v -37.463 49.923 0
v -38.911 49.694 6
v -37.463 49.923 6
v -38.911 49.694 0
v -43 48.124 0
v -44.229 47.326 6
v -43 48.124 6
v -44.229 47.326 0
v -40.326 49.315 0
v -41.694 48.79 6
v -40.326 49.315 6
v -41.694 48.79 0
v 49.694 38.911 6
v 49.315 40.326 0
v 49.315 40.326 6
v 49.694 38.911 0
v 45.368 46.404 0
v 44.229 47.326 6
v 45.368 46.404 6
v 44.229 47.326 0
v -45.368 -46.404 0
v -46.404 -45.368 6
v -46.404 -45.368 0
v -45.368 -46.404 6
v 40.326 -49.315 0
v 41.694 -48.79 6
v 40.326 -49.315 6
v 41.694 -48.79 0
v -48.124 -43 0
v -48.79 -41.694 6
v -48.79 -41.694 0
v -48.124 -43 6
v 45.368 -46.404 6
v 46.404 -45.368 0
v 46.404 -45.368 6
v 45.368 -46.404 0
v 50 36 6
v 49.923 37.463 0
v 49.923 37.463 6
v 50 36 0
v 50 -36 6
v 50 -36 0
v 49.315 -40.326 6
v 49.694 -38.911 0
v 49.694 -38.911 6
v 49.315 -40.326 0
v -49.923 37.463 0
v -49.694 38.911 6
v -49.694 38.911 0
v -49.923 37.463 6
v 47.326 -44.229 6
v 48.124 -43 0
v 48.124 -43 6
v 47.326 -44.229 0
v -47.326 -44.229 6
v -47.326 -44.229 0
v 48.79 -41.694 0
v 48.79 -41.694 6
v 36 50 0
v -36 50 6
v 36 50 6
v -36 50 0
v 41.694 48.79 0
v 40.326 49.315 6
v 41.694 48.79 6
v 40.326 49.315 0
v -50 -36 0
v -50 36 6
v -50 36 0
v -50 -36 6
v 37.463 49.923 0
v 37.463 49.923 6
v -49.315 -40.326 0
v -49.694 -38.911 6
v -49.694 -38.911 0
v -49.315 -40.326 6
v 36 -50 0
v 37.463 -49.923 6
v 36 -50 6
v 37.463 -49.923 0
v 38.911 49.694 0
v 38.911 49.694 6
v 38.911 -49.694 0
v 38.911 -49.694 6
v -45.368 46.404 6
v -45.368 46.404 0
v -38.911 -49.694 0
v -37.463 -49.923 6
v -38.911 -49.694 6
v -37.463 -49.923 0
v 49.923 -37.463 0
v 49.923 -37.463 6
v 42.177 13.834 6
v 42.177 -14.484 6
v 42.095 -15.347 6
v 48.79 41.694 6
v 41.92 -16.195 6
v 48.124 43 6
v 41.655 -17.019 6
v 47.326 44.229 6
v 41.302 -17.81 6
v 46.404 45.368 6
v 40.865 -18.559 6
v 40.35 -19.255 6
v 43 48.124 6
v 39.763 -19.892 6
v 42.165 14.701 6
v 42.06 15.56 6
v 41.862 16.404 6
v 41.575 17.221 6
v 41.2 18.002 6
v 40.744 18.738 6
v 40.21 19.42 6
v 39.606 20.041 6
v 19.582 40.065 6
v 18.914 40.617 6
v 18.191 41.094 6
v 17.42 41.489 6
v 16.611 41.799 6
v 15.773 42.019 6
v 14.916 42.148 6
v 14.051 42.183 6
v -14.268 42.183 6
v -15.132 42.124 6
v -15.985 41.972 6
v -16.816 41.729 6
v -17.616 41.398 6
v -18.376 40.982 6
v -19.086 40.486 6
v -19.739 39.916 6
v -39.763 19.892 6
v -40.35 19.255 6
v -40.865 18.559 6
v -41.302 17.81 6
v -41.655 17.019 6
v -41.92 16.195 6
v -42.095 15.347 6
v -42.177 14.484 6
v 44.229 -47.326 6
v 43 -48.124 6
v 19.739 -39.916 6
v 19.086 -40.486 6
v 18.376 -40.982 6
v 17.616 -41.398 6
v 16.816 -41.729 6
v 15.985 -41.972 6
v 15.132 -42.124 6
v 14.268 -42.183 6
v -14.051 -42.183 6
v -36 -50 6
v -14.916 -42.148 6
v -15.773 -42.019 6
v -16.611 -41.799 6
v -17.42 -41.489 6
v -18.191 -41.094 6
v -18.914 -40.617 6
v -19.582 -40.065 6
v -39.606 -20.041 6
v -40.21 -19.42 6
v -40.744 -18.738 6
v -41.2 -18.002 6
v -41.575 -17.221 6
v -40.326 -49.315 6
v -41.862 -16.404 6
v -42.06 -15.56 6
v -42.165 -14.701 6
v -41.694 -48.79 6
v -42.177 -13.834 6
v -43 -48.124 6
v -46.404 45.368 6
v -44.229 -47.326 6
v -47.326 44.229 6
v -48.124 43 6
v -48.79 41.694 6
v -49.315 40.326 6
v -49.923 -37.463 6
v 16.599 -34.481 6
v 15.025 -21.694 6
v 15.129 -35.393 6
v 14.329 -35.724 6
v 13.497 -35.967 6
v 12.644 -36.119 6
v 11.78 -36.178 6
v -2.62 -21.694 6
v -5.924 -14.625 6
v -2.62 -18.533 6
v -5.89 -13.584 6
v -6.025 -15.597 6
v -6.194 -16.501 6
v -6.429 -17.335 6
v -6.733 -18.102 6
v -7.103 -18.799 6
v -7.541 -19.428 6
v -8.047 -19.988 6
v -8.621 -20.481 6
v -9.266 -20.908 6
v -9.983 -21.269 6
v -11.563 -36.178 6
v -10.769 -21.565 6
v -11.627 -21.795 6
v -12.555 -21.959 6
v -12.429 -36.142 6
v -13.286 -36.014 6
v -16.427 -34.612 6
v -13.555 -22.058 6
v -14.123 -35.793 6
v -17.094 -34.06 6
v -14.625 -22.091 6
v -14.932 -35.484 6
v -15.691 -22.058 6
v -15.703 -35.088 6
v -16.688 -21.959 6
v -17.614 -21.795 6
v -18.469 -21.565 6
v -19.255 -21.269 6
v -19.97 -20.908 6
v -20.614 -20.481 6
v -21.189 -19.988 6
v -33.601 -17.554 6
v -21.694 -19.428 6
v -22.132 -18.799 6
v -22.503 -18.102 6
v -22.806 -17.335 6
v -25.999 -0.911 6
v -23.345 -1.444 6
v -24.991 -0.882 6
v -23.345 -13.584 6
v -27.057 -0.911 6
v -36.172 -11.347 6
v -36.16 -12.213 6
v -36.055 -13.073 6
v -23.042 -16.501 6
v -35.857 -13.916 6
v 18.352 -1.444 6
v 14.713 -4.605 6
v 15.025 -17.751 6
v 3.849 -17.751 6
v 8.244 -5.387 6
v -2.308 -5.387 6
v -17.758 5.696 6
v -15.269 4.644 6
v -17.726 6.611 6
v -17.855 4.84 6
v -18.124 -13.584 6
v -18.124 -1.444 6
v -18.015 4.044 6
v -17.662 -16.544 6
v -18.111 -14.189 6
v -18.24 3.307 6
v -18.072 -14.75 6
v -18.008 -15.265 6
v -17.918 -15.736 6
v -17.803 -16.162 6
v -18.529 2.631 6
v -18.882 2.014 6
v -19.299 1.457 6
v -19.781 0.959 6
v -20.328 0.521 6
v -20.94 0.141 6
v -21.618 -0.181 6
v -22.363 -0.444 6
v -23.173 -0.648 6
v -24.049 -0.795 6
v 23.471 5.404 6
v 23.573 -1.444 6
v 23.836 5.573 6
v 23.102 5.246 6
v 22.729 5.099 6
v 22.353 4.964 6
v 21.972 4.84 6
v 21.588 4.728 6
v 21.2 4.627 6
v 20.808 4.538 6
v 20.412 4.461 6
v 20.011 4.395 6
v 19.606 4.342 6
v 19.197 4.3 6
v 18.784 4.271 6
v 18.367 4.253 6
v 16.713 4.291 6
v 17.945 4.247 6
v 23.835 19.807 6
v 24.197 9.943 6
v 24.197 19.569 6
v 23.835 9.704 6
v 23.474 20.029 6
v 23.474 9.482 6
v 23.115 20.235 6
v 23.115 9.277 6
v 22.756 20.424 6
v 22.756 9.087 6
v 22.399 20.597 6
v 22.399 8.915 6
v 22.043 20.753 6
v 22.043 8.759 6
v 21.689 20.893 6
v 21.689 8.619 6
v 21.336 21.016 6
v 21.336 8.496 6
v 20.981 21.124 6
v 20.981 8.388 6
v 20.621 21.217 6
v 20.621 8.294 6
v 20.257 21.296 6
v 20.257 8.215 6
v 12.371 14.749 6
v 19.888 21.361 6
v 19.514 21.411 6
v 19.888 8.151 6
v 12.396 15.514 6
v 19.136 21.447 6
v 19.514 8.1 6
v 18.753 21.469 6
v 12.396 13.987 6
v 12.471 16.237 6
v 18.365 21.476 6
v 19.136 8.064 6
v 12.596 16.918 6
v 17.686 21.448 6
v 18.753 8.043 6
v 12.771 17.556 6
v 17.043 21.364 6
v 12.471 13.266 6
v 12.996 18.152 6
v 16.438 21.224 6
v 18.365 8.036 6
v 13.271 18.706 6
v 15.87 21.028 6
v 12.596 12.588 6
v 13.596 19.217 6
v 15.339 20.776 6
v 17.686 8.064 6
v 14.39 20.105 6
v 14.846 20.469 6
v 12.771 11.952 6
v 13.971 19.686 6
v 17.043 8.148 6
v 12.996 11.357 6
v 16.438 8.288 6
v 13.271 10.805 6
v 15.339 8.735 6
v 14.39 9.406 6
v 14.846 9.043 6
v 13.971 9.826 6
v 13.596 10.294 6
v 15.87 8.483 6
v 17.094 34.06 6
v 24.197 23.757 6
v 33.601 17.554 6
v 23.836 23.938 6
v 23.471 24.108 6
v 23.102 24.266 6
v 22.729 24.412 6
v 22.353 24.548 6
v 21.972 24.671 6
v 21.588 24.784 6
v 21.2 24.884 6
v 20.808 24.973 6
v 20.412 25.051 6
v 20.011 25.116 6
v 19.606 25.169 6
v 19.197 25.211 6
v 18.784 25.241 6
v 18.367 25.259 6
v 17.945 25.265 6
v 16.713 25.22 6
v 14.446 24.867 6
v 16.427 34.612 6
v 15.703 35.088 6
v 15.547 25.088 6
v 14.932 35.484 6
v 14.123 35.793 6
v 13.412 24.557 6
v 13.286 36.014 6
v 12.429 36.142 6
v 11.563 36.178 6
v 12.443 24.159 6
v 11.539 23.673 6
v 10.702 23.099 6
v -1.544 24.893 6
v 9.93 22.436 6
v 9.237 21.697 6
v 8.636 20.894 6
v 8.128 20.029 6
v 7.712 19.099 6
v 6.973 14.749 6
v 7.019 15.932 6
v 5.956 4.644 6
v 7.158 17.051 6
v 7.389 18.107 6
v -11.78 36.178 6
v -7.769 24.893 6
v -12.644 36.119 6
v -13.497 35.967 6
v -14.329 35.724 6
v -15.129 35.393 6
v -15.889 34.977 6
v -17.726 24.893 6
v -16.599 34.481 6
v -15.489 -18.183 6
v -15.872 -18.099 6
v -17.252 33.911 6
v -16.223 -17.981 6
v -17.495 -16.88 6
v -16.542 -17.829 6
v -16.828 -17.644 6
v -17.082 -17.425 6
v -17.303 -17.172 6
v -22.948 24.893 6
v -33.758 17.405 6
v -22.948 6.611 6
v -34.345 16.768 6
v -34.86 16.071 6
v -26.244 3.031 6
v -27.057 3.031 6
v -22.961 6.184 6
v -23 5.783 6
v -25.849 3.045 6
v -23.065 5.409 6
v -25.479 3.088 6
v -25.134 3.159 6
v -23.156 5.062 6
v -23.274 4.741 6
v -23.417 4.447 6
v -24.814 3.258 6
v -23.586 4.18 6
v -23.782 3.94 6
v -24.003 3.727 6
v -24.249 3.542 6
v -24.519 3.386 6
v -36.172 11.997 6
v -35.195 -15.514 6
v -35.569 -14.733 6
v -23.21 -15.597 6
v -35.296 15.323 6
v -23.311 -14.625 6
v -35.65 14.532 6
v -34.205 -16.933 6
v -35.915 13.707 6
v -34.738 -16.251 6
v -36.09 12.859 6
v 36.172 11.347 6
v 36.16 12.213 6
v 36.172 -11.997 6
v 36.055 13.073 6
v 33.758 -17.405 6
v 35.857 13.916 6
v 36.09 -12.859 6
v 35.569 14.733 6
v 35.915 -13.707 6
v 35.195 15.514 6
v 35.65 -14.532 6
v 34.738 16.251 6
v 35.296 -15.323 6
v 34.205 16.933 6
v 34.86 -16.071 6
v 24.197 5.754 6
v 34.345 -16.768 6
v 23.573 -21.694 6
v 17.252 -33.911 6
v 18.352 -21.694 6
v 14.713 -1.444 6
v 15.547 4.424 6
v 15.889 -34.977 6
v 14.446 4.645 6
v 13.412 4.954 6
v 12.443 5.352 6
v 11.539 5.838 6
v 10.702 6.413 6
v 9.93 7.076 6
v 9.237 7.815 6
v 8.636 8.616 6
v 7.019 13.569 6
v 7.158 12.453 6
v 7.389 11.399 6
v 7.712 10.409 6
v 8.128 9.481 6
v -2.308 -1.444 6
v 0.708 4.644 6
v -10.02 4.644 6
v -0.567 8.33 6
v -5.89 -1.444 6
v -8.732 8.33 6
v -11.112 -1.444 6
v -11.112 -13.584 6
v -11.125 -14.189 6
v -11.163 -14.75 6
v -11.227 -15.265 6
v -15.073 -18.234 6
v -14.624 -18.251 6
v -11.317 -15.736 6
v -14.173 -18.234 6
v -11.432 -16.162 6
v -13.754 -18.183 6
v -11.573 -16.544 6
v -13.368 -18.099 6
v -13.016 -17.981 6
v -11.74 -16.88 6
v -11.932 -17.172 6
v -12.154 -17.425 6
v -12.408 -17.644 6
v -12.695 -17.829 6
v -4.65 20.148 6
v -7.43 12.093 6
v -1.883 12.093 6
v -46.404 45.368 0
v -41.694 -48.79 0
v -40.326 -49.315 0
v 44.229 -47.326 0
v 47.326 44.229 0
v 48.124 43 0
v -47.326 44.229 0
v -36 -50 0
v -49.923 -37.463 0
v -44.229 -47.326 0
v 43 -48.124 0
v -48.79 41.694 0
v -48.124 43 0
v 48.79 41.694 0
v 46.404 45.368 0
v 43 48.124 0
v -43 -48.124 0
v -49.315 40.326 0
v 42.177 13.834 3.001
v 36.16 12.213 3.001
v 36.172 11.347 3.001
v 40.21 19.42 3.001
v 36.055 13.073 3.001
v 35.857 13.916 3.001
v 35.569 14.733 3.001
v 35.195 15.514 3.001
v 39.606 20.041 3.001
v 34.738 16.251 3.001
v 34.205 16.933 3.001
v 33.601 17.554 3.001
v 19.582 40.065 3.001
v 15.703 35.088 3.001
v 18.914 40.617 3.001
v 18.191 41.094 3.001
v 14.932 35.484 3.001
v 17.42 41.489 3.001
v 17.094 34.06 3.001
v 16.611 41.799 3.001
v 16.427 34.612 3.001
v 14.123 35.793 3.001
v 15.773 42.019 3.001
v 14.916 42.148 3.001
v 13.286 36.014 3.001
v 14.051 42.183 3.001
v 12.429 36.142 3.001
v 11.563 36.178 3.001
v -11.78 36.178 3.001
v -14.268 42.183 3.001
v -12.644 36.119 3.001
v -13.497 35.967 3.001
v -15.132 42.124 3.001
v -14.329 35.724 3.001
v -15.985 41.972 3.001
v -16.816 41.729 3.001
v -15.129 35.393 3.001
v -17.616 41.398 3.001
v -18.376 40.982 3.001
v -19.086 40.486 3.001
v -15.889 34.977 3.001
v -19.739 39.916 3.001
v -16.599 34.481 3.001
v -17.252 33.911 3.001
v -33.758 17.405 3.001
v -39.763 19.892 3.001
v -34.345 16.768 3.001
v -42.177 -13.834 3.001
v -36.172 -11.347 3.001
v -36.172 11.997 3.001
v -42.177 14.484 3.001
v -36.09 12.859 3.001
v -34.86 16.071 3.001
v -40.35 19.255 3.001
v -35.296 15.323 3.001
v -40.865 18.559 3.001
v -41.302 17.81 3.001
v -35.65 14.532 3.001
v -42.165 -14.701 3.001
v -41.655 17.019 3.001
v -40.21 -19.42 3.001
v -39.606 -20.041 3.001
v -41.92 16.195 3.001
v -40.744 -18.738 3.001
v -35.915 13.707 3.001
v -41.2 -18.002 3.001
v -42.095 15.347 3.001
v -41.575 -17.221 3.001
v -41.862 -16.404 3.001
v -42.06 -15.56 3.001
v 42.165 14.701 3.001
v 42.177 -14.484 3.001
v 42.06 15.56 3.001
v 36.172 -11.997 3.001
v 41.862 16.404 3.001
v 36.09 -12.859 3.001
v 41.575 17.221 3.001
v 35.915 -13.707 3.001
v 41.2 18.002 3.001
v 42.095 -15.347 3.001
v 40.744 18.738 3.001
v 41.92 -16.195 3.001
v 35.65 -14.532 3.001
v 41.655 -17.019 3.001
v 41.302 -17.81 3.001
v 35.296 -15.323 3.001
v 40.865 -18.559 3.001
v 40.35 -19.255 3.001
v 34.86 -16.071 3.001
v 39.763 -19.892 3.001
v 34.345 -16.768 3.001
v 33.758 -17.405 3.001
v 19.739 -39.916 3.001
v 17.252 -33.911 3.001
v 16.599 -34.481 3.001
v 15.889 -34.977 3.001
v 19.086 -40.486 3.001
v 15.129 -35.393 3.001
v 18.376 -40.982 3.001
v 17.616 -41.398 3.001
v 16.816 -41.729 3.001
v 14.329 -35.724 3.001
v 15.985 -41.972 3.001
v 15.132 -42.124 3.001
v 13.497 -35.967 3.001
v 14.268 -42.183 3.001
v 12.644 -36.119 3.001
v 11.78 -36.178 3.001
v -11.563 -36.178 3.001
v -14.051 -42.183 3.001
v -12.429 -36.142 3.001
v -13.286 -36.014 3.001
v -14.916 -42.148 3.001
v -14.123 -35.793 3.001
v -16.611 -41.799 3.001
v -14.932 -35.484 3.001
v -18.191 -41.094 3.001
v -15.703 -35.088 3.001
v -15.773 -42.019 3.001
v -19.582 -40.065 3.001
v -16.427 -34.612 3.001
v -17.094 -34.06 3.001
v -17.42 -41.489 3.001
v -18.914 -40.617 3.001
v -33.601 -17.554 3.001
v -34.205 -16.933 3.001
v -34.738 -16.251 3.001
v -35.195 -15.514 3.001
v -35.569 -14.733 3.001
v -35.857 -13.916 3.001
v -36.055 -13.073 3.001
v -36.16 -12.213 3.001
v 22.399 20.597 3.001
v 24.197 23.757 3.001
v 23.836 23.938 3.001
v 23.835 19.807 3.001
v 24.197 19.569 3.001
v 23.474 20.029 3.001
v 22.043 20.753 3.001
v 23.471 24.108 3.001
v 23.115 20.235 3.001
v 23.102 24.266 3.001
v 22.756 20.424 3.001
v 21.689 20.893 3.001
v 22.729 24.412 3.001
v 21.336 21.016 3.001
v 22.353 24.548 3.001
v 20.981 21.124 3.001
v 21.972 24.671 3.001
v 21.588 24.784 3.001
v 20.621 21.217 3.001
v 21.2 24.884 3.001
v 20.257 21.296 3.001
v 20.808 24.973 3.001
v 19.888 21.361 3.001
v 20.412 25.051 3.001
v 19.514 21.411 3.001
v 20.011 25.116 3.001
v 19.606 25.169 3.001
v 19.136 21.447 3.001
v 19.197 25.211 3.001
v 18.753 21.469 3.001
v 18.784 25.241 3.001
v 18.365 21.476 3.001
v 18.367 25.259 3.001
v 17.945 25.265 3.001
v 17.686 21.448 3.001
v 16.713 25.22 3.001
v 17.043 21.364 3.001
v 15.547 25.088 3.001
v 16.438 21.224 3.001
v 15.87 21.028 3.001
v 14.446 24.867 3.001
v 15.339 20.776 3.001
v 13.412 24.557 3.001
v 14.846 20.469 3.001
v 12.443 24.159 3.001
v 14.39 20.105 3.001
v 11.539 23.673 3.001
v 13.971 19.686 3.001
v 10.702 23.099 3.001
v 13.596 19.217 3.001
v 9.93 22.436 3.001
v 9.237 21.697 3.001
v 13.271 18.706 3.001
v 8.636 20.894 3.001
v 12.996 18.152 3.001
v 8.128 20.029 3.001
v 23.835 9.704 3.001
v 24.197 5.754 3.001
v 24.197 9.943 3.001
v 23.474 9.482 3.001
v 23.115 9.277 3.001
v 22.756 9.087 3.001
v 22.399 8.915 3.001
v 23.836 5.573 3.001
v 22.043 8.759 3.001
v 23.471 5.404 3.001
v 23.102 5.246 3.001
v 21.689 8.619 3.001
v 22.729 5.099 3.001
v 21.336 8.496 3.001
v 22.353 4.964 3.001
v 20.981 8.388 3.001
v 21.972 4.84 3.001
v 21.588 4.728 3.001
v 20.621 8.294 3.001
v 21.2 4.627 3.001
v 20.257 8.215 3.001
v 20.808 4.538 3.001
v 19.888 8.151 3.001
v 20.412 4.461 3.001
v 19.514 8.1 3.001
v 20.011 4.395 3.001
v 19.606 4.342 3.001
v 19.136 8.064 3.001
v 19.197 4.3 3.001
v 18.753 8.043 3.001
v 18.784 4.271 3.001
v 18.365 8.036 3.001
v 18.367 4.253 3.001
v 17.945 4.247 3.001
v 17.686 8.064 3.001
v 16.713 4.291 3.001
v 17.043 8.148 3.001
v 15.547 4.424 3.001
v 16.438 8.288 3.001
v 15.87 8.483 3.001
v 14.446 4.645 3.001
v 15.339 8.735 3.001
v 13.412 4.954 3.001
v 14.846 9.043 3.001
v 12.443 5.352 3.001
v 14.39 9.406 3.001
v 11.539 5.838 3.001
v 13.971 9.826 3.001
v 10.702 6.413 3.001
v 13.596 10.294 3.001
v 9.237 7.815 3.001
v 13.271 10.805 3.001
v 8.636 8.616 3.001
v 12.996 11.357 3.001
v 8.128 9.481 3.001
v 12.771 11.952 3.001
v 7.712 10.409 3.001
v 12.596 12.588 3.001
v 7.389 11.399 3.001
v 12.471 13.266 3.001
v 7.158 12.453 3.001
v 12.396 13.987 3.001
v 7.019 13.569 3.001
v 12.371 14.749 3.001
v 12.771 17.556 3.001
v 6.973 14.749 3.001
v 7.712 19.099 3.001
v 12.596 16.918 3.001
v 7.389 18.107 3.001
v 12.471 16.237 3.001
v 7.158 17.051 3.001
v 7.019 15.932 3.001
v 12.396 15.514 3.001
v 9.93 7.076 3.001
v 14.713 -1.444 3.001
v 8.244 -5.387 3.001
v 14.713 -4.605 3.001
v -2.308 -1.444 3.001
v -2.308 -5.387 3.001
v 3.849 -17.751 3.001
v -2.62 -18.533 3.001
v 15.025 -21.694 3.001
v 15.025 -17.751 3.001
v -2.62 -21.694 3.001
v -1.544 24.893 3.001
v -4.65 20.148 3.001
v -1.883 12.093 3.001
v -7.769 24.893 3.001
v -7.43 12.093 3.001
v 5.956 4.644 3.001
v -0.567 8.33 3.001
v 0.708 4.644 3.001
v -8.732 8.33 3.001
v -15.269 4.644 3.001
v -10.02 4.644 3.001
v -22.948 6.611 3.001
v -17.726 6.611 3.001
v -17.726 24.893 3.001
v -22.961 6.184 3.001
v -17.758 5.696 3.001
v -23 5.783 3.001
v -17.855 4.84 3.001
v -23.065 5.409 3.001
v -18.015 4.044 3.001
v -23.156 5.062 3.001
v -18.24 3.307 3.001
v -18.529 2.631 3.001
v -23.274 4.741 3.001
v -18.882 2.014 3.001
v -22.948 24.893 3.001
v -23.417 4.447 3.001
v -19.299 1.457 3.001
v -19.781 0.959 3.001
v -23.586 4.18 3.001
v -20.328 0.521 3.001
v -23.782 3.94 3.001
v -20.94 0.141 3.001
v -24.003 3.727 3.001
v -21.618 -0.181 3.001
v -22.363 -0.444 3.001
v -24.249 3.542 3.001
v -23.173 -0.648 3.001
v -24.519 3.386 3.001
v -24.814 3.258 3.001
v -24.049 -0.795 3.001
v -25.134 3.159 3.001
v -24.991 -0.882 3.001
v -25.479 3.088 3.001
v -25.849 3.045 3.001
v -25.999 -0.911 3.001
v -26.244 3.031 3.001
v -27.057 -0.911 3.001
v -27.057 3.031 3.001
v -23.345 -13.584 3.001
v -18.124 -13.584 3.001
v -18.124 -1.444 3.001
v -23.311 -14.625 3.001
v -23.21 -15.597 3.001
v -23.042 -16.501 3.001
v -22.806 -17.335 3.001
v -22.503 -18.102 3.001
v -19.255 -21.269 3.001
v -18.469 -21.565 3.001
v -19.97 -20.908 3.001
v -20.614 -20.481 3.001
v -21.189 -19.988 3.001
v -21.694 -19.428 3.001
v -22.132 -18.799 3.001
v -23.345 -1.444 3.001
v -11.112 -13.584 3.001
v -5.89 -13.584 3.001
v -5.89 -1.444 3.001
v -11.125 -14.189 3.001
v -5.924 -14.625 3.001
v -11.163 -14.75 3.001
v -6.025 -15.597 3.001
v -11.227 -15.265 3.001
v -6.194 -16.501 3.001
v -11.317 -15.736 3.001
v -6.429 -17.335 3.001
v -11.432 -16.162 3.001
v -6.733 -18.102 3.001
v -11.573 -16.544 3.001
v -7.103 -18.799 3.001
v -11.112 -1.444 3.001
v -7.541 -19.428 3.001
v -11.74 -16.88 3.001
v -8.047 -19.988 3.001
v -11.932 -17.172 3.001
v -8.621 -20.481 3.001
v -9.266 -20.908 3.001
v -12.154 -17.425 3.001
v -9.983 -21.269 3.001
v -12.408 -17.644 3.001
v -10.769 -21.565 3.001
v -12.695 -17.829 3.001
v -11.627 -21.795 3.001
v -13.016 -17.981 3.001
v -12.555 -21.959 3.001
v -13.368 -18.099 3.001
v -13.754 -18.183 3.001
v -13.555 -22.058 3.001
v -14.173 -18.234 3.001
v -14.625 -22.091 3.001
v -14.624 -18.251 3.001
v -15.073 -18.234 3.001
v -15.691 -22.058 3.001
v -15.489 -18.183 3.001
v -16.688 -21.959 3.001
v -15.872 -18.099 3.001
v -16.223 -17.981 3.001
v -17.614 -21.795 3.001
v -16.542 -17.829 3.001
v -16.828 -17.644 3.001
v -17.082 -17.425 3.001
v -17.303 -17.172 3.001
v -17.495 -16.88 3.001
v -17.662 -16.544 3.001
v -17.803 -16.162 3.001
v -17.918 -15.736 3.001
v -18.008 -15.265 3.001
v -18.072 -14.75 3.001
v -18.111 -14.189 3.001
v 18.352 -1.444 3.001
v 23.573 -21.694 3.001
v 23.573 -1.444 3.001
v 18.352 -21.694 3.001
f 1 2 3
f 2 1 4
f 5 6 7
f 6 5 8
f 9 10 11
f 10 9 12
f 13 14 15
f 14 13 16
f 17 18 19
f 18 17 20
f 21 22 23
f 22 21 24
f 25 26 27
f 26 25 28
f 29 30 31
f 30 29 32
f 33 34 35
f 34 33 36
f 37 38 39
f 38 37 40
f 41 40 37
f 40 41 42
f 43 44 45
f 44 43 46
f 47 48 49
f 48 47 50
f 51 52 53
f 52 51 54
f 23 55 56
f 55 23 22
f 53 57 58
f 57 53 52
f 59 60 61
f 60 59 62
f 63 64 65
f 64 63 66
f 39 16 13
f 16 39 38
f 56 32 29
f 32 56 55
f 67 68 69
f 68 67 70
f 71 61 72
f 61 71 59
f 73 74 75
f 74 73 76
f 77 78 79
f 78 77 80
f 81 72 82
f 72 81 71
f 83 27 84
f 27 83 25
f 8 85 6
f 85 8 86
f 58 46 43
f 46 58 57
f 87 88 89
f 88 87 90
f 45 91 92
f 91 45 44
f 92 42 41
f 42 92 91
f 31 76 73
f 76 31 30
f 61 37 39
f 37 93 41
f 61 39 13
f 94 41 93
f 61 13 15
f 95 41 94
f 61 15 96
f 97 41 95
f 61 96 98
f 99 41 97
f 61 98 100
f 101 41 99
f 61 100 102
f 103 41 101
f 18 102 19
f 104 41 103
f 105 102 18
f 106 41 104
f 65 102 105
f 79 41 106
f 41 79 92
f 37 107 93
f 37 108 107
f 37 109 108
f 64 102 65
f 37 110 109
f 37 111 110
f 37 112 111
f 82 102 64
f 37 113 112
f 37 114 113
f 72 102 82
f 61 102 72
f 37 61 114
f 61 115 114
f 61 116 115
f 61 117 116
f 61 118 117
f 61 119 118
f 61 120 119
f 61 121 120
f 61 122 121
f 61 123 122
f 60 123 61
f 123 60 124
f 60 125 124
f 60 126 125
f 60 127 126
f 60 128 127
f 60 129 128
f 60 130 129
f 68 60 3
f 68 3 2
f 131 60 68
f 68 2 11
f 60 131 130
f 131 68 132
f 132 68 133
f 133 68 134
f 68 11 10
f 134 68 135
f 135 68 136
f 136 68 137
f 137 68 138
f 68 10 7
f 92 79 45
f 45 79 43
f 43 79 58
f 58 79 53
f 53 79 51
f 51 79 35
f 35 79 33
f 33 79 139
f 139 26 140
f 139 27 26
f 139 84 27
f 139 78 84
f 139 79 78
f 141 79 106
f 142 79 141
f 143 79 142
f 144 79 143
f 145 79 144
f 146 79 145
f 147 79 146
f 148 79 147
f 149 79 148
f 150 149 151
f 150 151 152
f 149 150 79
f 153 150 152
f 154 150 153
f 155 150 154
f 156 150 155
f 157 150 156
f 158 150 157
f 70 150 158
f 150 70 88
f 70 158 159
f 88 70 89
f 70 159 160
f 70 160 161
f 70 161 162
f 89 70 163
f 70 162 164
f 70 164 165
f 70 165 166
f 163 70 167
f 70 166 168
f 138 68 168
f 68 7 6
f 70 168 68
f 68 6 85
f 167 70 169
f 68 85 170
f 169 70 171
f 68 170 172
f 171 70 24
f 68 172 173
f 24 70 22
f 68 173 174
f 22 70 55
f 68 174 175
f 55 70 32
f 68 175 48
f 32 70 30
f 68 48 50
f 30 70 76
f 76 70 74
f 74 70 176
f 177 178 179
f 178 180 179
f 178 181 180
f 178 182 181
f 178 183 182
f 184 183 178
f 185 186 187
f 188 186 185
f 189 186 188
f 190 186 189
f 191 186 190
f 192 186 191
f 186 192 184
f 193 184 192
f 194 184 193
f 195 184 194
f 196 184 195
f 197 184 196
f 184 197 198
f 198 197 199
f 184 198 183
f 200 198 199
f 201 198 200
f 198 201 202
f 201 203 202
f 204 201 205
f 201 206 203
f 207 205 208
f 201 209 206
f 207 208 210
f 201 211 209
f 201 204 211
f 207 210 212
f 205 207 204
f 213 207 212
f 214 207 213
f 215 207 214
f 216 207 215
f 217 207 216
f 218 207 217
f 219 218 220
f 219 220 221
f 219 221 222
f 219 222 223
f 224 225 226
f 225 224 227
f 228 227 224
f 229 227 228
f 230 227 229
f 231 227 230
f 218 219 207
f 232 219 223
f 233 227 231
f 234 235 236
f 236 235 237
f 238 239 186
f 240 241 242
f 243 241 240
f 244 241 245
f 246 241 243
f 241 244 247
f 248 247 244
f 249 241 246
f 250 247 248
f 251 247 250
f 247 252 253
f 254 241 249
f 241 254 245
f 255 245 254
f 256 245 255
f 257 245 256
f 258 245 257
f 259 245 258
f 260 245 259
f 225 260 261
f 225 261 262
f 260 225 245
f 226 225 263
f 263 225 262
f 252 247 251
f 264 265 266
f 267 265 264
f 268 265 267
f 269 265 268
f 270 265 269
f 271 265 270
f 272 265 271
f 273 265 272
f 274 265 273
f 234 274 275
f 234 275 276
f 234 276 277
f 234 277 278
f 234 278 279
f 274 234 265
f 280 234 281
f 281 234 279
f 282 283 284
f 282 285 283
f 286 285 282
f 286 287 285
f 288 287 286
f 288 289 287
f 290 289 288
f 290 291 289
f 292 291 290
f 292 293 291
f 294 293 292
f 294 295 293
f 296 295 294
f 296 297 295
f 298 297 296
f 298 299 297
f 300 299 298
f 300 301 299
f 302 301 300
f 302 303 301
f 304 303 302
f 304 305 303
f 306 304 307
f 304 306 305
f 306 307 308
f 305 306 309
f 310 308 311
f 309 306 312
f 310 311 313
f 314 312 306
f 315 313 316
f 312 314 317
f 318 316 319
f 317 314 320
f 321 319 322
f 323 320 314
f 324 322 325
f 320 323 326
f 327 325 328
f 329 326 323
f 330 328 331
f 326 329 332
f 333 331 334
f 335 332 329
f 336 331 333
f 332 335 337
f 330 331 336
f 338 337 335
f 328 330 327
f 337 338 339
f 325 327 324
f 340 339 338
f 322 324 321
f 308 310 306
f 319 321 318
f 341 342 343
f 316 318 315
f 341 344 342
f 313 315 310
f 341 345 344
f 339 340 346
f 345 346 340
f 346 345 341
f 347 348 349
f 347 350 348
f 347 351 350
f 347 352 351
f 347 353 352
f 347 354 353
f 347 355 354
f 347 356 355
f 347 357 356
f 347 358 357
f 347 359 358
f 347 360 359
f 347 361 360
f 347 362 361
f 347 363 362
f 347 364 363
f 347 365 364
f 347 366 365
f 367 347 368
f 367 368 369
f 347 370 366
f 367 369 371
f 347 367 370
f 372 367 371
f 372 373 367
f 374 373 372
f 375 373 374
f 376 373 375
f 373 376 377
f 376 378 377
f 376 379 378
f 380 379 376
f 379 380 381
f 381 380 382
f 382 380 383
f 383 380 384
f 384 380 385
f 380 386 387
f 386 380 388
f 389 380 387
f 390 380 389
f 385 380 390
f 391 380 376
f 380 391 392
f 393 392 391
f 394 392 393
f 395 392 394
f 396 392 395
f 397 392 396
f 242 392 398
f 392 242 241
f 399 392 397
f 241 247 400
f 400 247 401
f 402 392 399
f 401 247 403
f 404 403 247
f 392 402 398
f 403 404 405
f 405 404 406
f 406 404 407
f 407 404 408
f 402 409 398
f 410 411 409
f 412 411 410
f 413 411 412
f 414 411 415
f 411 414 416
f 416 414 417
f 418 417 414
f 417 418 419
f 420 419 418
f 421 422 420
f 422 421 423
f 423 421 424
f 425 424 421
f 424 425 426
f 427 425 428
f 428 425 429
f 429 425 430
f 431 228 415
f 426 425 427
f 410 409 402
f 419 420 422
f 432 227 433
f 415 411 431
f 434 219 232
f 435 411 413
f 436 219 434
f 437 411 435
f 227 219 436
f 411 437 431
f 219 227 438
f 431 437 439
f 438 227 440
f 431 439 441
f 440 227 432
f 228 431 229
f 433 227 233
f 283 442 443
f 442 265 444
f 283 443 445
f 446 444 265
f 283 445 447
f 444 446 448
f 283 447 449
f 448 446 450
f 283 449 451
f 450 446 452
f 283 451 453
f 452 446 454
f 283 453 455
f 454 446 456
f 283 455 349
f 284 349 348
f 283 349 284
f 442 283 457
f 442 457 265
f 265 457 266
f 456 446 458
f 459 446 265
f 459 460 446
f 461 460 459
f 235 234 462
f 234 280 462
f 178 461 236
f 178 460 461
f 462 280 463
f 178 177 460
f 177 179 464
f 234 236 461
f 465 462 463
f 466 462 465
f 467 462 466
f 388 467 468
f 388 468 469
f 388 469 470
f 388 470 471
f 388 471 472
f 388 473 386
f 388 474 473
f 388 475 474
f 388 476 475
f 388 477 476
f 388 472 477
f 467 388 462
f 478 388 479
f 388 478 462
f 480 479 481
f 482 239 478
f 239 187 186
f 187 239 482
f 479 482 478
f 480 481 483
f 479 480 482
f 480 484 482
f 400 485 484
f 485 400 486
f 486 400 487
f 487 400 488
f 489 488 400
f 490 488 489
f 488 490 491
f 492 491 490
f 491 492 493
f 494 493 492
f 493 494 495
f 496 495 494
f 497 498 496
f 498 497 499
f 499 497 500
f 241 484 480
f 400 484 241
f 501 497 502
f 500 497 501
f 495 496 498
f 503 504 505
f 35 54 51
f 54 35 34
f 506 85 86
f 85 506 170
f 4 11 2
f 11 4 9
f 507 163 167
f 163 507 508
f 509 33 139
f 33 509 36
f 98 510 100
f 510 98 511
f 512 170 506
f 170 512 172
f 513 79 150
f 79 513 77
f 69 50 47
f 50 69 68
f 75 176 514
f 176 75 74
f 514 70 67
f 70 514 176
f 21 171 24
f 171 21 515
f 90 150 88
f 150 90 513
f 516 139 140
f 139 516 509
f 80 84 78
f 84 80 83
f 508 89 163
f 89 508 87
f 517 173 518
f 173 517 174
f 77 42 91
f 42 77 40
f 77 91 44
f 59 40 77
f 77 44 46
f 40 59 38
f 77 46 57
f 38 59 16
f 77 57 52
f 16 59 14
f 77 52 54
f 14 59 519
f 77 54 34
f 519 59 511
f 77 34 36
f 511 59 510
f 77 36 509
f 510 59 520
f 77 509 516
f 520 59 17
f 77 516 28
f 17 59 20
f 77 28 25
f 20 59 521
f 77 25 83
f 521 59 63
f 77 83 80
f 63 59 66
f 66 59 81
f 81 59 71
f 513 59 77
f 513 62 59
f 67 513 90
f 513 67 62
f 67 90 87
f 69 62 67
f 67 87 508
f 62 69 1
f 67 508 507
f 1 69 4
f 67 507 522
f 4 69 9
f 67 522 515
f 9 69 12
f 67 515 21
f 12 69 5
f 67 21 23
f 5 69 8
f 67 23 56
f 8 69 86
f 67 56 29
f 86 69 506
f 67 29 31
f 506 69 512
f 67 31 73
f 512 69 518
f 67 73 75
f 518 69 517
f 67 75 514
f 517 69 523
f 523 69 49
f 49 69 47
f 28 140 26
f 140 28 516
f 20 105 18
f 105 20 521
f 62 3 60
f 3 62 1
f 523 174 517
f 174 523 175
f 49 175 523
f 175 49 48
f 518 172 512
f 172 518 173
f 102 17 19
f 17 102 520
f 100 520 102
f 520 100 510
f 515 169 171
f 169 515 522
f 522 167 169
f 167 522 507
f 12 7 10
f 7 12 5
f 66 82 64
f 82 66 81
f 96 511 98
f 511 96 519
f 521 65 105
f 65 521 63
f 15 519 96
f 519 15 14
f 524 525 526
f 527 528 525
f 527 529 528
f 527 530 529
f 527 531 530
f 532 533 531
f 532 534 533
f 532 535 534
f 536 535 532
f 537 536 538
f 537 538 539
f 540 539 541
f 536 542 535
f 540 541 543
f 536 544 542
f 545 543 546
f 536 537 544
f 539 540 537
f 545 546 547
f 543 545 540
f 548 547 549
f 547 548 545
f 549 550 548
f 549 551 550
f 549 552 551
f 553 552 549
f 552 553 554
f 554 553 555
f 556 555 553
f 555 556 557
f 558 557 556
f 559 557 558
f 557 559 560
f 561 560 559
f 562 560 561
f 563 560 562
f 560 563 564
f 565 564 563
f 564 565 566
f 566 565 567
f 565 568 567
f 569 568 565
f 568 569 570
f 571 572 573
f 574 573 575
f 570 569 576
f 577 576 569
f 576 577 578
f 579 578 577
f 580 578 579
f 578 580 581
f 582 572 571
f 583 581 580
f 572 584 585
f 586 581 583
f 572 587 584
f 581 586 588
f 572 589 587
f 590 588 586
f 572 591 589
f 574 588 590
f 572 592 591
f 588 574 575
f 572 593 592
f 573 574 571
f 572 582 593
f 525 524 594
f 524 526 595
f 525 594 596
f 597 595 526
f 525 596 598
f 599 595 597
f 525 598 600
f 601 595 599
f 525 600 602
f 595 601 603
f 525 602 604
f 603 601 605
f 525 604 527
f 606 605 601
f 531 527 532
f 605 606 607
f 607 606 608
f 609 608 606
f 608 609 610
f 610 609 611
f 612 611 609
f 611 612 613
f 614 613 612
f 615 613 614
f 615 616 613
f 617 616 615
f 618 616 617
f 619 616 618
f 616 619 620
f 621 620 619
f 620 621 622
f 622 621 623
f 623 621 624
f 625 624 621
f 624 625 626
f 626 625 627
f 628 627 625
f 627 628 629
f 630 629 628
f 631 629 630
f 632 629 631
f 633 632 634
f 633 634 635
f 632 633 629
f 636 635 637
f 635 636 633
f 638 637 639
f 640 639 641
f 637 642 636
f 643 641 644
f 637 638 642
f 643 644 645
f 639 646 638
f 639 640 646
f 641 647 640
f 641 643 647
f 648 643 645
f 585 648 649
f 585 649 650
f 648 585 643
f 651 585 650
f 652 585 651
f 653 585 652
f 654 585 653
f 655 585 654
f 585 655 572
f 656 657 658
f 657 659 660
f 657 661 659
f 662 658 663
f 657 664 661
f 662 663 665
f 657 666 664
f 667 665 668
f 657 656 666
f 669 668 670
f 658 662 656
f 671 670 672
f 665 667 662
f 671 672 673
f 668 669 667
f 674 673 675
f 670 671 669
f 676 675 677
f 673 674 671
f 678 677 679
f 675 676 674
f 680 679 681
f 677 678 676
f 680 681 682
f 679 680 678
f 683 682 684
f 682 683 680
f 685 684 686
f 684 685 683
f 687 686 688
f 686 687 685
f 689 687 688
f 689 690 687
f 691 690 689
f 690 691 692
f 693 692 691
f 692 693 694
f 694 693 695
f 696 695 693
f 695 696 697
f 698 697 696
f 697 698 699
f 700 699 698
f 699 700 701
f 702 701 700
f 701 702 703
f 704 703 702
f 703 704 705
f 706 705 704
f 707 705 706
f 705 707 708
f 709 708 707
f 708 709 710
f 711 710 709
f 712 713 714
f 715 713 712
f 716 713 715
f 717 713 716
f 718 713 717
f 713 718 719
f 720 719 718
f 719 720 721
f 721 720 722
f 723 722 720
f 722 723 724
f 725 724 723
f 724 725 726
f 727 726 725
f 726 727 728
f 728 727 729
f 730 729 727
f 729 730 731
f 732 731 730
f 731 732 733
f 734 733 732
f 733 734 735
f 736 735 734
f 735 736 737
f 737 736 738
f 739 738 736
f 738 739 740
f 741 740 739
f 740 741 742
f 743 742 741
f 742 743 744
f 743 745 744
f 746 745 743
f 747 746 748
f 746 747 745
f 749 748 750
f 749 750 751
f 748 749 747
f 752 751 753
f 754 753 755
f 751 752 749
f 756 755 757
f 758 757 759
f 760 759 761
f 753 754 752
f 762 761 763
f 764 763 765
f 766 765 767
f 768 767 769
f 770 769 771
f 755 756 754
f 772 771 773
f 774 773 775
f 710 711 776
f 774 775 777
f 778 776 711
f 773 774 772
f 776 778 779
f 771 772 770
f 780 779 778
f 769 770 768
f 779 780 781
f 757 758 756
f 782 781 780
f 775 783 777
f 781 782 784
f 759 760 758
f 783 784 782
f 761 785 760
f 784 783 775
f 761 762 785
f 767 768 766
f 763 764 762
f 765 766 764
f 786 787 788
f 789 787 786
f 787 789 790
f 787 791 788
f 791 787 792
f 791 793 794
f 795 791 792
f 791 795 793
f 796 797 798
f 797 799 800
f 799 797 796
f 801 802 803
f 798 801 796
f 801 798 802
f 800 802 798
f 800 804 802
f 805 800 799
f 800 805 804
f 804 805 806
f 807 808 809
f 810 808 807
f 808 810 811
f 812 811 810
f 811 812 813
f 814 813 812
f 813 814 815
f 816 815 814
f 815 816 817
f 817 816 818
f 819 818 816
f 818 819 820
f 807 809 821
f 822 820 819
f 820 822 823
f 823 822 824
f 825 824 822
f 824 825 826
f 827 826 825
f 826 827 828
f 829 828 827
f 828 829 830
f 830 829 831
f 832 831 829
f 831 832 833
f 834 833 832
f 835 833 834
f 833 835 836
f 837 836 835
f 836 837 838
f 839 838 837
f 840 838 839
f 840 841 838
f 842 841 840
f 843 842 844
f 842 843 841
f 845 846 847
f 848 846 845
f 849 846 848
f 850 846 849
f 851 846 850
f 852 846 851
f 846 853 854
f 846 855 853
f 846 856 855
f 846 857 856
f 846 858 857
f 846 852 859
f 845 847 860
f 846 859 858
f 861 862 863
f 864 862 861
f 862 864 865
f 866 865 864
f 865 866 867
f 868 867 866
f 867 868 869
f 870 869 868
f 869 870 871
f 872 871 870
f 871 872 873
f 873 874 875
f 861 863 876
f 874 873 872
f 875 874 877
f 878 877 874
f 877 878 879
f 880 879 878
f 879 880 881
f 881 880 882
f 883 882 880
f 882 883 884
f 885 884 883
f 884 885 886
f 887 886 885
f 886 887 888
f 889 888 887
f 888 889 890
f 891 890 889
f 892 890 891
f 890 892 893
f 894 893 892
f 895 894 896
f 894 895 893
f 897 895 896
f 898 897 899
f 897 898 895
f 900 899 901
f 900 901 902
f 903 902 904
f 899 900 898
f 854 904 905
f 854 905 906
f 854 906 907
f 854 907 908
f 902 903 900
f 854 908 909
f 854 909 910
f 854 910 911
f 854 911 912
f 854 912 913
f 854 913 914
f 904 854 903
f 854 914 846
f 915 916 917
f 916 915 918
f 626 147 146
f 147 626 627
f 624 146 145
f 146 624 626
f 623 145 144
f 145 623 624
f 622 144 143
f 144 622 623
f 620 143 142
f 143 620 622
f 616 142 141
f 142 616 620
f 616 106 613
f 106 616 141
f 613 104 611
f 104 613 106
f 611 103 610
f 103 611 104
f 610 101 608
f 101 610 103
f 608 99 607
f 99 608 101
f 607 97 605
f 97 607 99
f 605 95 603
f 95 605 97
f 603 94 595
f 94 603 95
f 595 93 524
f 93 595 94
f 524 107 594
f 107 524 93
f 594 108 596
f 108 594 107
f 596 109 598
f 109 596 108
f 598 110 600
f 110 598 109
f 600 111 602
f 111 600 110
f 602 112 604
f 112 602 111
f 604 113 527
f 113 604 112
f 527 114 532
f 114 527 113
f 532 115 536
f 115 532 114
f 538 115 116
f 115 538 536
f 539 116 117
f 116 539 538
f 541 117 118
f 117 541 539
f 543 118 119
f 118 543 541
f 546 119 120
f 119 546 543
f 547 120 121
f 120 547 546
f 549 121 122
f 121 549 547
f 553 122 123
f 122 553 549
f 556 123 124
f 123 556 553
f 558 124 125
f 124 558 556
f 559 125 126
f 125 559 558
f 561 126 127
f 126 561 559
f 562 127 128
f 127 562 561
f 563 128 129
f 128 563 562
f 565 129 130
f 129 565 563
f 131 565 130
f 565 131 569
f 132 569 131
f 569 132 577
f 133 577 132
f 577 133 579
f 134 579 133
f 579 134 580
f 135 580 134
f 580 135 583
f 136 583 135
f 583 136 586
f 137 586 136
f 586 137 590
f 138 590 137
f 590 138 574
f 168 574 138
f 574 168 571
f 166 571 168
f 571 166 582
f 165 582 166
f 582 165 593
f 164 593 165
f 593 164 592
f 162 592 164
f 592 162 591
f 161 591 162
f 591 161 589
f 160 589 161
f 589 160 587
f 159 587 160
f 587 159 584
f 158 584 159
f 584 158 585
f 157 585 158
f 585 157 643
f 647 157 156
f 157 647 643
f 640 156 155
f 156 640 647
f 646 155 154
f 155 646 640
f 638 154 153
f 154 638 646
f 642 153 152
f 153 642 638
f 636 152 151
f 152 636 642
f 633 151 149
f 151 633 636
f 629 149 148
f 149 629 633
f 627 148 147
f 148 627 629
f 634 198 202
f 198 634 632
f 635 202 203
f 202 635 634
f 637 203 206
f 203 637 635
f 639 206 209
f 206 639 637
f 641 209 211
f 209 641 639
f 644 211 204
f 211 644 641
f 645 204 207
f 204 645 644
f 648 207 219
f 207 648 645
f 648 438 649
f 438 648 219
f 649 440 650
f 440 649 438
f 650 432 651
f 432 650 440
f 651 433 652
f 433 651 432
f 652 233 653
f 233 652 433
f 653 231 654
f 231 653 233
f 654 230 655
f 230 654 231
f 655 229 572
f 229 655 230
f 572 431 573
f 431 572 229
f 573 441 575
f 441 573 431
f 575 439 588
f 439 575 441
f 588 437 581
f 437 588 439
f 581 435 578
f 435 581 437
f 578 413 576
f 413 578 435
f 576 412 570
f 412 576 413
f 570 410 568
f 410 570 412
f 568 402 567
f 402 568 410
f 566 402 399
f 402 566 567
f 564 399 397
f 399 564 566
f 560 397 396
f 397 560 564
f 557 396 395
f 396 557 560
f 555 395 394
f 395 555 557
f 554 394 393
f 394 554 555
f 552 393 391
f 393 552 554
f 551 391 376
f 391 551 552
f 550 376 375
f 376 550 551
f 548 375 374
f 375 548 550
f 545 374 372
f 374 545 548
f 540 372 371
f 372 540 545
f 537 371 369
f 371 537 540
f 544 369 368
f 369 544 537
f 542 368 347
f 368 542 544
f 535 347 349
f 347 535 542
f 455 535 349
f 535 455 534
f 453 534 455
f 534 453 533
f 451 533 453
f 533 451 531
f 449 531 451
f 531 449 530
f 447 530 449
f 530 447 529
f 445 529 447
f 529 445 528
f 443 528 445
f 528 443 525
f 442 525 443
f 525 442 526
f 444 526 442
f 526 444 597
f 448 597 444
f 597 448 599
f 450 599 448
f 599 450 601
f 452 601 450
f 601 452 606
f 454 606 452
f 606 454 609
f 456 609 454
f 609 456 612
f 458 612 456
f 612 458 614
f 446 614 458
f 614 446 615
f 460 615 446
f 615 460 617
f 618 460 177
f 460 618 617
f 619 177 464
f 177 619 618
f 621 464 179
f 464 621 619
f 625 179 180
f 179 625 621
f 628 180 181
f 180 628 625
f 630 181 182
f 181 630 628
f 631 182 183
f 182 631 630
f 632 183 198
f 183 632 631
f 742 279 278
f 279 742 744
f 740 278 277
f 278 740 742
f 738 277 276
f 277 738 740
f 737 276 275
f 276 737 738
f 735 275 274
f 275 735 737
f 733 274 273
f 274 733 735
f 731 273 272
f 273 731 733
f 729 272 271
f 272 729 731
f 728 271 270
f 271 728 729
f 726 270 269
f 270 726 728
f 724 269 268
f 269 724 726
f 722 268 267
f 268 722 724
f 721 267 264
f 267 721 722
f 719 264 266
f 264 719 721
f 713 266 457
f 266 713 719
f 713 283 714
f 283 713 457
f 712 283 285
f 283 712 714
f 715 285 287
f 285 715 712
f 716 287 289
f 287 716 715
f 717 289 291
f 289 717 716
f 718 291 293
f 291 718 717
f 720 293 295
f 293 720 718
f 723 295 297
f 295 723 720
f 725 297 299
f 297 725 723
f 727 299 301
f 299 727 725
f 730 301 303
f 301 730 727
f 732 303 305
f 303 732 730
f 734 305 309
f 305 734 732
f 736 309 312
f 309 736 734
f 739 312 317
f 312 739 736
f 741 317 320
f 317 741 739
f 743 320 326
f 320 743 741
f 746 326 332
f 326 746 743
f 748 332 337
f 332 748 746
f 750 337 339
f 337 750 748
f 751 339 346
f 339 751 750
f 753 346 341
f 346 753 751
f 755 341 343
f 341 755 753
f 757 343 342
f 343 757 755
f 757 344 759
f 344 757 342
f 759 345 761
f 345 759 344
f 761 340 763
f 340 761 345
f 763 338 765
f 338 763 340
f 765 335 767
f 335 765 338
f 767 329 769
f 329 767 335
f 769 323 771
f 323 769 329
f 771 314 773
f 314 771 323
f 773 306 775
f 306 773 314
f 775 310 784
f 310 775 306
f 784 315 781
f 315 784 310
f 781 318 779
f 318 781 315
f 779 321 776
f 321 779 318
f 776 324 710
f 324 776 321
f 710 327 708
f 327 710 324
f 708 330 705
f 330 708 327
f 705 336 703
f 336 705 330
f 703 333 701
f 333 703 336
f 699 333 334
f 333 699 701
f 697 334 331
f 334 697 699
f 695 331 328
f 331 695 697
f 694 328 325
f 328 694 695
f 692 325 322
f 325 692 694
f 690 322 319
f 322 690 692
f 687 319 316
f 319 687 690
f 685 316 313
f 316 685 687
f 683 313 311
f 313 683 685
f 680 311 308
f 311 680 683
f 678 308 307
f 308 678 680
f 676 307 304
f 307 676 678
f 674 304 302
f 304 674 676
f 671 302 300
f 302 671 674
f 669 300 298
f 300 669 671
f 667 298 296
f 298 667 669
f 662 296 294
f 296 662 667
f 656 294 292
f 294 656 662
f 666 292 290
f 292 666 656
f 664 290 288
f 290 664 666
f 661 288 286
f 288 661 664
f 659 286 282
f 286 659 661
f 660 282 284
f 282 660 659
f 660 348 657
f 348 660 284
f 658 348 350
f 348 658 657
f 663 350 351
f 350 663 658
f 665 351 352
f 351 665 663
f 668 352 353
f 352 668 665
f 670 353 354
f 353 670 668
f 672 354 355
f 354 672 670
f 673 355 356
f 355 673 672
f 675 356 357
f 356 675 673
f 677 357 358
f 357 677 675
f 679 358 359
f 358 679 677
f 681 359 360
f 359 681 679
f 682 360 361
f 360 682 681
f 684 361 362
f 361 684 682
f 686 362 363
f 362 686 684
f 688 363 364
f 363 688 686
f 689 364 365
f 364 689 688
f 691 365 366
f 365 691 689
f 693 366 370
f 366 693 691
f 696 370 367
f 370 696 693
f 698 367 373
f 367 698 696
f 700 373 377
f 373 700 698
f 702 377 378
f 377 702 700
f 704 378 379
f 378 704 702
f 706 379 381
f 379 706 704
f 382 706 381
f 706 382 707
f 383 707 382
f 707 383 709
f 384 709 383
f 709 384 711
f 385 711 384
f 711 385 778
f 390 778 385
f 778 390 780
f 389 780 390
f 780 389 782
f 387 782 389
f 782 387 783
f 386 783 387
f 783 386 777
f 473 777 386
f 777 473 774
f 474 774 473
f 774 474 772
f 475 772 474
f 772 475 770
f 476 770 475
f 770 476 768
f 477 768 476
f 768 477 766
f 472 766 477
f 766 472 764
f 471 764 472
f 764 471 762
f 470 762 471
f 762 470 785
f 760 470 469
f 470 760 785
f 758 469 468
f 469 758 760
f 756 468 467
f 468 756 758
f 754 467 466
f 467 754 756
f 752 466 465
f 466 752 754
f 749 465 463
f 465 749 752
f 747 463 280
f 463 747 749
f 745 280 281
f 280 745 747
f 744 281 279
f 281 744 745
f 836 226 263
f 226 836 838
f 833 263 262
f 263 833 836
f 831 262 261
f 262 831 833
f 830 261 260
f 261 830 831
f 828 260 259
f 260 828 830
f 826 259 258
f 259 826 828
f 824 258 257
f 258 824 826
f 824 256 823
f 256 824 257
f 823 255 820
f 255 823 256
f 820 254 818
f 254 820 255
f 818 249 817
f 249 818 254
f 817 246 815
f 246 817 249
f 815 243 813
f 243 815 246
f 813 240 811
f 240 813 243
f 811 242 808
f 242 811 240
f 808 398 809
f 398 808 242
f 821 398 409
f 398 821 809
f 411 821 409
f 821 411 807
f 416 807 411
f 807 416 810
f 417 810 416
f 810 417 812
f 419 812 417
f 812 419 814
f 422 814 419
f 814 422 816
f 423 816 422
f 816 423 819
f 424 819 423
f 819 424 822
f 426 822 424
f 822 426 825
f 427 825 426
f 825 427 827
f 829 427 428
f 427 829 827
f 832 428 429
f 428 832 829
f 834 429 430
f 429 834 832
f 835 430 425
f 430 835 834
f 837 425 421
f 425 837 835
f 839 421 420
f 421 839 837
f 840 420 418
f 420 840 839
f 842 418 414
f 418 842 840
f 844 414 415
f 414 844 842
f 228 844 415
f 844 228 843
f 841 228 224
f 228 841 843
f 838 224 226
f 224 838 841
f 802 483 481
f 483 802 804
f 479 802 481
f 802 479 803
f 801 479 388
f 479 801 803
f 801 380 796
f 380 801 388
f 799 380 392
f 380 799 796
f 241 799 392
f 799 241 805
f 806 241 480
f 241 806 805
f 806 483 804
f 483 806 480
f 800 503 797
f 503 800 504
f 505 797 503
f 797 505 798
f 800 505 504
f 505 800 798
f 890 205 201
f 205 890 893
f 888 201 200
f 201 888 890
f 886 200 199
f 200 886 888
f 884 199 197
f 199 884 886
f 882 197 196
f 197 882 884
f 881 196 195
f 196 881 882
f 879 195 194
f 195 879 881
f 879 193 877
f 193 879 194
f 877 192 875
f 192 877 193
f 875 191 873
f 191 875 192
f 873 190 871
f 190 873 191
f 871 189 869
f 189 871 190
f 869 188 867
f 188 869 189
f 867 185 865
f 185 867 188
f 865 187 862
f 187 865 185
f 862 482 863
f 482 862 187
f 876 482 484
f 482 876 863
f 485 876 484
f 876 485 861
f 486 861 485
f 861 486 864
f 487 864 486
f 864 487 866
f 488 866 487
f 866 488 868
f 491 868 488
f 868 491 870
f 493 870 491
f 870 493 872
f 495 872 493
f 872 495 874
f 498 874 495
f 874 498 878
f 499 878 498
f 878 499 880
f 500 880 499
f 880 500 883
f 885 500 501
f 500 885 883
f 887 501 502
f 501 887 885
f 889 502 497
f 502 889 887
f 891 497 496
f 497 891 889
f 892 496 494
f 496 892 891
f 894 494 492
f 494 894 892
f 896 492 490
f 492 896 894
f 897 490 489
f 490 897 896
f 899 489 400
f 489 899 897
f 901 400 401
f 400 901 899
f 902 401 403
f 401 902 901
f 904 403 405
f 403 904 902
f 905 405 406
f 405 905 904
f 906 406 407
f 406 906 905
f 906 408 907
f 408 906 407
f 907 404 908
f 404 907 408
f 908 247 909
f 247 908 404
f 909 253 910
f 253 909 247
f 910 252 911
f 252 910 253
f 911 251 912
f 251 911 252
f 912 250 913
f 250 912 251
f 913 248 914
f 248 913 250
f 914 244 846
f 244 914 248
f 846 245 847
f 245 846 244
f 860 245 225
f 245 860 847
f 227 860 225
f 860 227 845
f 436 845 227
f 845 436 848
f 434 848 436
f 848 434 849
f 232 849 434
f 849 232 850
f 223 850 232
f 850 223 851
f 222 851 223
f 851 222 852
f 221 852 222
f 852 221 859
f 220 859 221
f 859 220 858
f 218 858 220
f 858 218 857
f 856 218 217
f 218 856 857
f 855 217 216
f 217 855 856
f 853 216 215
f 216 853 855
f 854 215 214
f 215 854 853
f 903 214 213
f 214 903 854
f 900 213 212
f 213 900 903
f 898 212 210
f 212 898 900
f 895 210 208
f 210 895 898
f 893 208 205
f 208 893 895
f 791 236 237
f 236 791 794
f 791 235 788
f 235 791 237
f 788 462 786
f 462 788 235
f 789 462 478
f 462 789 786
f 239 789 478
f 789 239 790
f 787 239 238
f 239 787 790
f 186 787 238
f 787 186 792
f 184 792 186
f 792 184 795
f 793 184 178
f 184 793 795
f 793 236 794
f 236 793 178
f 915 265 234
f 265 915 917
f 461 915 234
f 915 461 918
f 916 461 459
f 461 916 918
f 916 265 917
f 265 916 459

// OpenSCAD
// file: coaster_lib.scad
$fa = 6;
$fs = 0.875;

module coaster_base_3d(size, thickness, border_radius) {
    linear_extrude(height = thickness) {
        minkowski() {
            cube_size = size - border_radius * 2;

            square(size = [cube_size, cube_size], center = true);
            circle(r = border_radius);
        }
    }
}

module epayslips_logo_2d(size) {
    difference() {
        rotate(a = 45)
        minkowski() {
            roundness = 22;
            cube_size = size * 0.5 - roundness;

            square(size = [cube_size, cube_size], center = true);
            circle(r = roundness);
        }

        minkowski() {
            roundness = 10;
            cube_size = size * 0.25 - roundness;

            square(size = [cube_size, cube_size], center = true);
            circle(r = roundness);
        }
    }
}

module datacode_logo_2d(size) {
    difference() {
        rotate(a = 45 / 2)
        minkowski() {
            roundness = 8;
            circle(r = size * 0.38 - roundness, $fn = 8);
            circle(r = roundness);
        }

        circle(r = size * 0.12);

        translate([0, size / 4, 0]) {
            square(size = [size * 0.1, size / 2], center = true);
        }
    }
}

module sj_logo_2d(size) {
    rotate(a = 45 / 2)
    difference() {
        roundness = 8;

        minkowski() {
            circle(r = size * 0.45 - roundness, $fn = 8);
            circle(r = roundness);
        }

        minkowski() {
            circle(r = size * 0.385 - roundness, $fn = 8);
            circle(r = roundness);
        }
    }

    text_size = size * 0.2;
    text_offset = text_size / 2 + 2;

    translate([0, text_offset, 0])
    text(
        text = "JAC",
        halign = "center",
        valign = "center",
        font = "Roboto Mono for Powerline:style=Bold",
        size = size * 0.2
    );

    translate([0, -text_offset, 0])
    text(
        text = "UZI",
        halign = "center",
        valign = "center",
        font = "Roboto Mono for Powerline:style=Bold",
        size = size * 0.2
    );
}
// main file
include<coaster_lib.scad>;

$fa = 6;
$fs = 0.875;

size = 100;
border_radius = 14;
thickness = 6;

difference() {
    coaster_base_3d(size, thickness, border_radius);

    translate([0, 0, thickness / 2 + 0.001]) {
        linear_extrude(height = thickness / 2) {
            sj_logo_2d(size);
        }
    }
}
